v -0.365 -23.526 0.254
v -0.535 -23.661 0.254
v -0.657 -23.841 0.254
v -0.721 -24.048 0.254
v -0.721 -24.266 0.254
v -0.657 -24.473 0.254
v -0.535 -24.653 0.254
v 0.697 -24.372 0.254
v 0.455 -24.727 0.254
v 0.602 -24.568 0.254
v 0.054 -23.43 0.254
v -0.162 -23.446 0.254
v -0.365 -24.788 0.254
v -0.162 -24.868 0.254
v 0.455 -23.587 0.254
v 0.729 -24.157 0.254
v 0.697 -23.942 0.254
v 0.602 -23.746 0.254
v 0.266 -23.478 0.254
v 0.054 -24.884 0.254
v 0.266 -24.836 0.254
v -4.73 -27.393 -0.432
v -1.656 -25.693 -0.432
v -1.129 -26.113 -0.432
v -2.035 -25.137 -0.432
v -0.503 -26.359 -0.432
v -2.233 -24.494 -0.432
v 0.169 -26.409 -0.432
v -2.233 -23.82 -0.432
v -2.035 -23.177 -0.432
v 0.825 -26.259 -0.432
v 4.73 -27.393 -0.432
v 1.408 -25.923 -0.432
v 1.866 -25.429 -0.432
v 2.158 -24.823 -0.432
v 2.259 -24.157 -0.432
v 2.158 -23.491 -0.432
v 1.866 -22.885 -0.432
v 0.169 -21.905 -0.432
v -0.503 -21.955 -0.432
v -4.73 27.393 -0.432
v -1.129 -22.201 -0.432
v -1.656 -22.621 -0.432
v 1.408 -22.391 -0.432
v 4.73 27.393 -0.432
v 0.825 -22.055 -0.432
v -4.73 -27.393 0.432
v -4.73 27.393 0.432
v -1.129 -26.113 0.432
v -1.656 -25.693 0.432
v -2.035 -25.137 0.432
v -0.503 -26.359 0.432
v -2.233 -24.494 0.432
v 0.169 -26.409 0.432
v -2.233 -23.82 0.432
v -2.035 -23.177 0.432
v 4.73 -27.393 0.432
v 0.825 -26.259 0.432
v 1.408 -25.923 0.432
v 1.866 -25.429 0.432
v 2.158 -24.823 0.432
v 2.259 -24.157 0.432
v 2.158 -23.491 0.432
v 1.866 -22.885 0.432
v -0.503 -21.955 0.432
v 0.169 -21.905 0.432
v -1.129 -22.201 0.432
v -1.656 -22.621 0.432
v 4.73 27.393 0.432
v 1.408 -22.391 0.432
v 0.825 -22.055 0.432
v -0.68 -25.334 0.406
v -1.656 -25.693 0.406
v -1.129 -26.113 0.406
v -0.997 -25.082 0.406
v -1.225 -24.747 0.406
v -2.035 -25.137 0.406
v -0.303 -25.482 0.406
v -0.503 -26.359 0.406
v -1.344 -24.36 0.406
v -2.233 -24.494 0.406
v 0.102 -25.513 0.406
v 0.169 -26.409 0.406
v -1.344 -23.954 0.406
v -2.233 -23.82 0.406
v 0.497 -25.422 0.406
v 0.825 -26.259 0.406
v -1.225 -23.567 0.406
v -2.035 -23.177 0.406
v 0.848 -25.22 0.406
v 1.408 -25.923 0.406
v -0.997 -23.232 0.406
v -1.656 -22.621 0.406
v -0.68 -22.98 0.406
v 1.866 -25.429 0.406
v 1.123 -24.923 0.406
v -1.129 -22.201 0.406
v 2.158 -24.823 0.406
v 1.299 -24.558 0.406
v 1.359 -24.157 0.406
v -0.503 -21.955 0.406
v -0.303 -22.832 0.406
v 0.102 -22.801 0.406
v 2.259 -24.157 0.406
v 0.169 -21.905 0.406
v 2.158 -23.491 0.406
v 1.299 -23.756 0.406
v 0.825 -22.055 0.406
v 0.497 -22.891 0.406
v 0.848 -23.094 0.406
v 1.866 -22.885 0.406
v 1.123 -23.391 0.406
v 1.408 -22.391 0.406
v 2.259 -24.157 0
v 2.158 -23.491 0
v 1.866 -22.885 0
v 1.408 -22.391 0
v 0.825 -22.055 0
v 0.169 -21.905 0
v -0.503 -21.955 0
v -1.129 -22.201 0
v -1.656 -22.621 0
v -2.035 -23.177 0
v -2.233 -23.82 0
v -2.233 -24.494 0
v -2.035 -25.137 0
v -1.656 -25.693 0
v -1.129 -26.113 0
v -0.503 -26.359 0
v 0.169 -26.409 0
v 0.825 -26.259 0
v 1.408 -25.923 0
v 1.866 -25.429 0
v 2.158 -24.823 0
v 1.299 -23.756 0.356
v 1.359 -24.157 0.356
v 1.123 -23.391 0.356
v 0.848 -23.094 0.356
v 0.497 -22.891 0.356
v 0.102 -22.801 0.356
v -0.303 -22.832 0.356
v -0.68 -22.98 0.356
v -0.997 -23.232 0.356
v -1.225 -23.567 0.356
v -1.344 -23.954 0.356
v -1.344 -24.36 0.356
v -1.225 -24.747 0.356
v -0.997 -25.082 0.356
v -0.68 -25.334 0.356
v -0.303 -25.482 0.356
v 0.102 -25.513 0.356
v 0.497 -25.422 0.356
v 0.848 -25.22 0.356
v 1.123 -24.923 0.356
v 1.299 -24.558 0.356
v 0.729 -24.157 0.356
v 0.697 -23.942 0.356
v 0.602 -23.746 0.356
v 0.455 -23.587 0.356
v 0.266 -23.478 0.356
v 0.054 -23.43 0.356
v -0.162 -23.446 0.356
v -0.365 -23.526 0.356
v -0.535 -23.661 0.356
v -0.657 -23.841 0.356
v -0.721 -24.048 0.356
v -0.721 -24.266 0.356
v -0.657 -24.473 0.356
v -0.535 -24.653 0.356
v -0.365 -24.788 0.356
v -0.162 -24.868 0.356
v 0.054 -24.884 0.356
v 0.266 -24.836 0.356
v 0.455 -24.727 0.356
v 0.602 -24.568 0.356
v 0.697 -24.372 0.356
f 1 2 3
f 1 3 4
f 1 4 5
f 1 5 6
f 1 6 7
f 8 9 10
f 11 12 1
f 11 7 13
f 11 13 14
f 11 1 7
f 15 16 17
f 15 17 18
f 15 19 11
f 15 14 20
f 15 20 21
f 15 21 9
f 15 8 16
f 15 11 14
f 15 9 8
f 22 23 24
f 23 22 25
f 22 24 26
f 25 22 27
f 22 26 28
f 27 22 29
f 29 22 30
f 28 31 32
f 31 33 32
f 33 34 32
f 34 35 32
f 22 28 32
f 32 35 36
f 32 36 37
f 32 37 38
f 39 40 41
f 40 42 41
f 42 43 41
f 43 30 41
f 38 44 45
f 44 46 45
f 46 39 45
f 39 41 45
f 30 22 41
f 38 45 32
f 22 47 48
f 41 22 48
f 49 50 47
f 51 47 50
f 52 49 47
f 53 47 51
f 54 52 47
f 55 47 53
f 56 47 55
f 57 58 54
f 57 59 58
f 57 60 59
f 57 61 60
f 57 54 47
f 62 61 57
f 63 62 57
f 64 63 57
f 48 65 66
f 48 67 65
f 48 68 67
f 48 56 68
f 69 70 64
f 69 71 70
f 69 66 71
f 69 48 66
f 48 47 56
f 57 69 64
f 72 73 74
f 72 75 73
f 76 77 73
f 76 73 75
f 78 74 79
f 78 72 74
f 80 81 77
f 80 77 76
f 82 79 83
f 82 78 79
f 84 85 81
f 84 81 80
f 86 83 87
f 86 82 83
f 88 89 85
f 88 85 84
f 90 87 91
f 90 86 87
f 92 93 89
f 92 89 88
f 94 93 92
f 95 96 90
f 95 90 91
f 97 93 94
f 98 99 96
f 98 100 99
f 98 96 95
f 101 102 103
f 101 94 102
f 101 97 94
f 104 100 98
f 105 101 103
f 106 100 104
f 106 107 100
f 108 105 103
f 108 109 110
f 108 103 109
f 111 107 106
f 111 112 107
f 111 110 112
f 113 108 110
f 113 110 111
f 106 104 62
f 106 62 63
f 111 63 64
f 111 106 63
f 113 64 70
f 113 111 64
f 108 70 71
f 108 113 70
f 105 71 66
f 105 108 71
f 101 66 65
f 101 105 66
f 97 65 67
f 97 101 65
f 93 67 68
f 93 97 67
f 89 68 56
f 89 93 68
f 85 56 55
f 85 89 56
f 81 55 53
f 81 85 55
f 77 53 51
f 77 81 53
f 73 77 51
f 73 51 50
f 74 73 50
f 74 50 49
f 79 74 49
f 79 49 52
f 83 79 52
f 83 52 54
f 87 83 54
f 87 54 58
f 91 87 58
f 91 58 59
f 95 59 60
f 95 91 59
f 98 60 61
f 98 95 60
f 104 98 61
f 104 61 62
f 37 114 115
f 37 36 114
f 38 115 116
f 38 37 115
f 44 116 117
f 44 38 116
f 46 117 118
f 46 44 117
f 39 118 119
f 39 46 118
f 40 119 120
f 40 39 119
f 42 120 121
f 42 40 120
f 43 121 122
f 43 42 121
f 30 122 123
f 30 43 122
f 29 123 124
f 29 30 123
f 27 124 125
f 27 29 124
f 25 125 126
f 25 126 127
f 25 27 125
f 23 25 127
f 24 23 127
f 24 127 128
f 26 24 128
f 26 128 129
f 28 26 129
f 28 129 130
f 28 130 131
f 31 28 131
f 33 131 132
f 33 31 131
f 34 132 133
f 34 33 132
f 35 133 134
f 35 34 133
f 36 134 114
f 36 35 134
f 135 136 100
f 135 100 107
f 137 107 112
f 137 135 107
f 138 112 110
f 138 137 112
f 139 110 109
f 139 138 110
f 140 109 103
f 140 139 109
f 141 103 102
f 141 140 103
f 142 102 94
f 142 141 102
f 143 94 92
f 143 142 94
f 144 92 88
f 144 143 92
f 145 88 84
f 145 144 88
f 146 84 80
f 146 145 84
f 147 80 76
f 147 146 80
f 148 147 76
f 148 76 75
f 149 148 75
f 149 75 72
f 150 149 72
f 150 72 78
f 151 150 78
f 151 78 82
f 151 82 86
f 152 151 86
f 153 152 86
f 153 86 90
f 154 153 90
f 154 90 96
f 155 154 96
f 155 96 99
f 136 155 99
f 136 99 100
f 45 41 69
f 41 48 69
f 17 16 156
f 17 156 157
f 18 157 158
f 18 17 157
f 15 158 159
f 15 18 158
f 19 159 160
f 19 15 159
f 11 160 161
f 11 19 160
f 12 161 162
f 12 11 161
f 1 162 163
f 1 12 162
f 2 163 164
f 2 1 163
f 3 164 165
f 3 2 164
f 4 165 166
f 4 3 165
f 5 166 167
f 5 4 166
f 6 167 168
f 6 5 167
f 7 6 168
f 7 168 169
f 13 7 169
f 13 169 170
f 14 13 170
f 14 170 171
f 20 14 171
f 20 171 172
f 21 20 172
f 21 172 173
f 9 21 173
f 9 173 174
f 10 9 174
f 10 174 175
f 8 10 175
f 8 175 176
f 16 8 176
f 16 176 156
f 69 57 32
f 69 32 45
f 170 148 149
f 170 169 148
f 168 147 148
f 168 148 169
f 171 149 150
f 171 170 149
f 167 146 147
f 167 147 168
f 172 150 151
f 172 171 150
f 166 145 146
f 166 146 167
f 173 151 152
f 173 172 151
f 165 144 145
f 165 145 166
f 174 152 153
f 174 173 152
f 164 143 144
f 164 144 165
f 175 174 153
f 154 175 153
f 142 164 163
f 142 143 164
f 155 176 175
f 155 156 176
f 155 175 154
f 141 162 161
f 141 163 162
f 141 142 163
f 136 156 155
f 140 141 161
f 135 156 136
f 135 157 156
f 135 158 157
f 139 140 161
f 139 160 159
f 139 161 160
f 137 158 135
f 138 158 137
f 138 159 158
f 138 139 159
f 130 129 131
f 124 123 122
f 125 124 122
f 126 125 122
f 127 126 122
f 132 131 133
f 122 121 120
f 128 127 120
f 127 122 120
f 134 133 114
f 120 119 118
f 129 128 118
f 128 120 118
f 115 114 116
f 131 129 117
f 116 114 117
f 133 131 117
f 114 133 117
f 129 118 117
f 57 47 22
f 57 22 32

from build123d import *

# Parameters (mm, degrees)
F0_W     = 9.45931
F0_H     = 54.78517
F0_R     = 2.258507
F1_DEPTH = 0.4318
F0_R_2   = 1.35948
F2_DEPTH = 0.4064
F0_R_3   = 0.729172
F3_DEPTH = 0.3556
F4_DEPTH = 0.254


with BuildPart() as f1:
    # F0 (on Top) → F1 (new body, symmetric)
    with BuildSketch(Plane.XY):
        Rectangle(F0_W, F0_H)
        with Locations((0, -24.156982)):
            Circle(F0_R, mode=Mode.SUBTRACT)
    extrude(amount=F1_DEPTH, both=True)

    # F0 (on Top) → F2 (join)
    with BuildSketch(Plane.XY):
        with Locations((0, -24.156982)):
            Circle(F0_R)
        with Locations((0, -24.156982)):
            Circle(F0_R_2, mode=Mode.SUBTRACT)
    extrude(amount=F2_DEPTH)

    # F0 (on Top) → F3 (join)
    with BuildSketch(Plane.XY):
        with Locations((0, -24.156982)):
            Circle(F0_R_2)
        with Locations((0, -24.156982)):
            Circle(F0_R_3, mode=Mode.SUBTRACT)
    extrude(amount=F3_DEPTH)

    # F0 (on Top) → F4 (join)
    with BuildSketch(Plane.XY):
        with Locations((0, -24.156982)):
            Circle(F0_R_3)
    extrude(amount=F4_DEPTH)


solid = f1.part
